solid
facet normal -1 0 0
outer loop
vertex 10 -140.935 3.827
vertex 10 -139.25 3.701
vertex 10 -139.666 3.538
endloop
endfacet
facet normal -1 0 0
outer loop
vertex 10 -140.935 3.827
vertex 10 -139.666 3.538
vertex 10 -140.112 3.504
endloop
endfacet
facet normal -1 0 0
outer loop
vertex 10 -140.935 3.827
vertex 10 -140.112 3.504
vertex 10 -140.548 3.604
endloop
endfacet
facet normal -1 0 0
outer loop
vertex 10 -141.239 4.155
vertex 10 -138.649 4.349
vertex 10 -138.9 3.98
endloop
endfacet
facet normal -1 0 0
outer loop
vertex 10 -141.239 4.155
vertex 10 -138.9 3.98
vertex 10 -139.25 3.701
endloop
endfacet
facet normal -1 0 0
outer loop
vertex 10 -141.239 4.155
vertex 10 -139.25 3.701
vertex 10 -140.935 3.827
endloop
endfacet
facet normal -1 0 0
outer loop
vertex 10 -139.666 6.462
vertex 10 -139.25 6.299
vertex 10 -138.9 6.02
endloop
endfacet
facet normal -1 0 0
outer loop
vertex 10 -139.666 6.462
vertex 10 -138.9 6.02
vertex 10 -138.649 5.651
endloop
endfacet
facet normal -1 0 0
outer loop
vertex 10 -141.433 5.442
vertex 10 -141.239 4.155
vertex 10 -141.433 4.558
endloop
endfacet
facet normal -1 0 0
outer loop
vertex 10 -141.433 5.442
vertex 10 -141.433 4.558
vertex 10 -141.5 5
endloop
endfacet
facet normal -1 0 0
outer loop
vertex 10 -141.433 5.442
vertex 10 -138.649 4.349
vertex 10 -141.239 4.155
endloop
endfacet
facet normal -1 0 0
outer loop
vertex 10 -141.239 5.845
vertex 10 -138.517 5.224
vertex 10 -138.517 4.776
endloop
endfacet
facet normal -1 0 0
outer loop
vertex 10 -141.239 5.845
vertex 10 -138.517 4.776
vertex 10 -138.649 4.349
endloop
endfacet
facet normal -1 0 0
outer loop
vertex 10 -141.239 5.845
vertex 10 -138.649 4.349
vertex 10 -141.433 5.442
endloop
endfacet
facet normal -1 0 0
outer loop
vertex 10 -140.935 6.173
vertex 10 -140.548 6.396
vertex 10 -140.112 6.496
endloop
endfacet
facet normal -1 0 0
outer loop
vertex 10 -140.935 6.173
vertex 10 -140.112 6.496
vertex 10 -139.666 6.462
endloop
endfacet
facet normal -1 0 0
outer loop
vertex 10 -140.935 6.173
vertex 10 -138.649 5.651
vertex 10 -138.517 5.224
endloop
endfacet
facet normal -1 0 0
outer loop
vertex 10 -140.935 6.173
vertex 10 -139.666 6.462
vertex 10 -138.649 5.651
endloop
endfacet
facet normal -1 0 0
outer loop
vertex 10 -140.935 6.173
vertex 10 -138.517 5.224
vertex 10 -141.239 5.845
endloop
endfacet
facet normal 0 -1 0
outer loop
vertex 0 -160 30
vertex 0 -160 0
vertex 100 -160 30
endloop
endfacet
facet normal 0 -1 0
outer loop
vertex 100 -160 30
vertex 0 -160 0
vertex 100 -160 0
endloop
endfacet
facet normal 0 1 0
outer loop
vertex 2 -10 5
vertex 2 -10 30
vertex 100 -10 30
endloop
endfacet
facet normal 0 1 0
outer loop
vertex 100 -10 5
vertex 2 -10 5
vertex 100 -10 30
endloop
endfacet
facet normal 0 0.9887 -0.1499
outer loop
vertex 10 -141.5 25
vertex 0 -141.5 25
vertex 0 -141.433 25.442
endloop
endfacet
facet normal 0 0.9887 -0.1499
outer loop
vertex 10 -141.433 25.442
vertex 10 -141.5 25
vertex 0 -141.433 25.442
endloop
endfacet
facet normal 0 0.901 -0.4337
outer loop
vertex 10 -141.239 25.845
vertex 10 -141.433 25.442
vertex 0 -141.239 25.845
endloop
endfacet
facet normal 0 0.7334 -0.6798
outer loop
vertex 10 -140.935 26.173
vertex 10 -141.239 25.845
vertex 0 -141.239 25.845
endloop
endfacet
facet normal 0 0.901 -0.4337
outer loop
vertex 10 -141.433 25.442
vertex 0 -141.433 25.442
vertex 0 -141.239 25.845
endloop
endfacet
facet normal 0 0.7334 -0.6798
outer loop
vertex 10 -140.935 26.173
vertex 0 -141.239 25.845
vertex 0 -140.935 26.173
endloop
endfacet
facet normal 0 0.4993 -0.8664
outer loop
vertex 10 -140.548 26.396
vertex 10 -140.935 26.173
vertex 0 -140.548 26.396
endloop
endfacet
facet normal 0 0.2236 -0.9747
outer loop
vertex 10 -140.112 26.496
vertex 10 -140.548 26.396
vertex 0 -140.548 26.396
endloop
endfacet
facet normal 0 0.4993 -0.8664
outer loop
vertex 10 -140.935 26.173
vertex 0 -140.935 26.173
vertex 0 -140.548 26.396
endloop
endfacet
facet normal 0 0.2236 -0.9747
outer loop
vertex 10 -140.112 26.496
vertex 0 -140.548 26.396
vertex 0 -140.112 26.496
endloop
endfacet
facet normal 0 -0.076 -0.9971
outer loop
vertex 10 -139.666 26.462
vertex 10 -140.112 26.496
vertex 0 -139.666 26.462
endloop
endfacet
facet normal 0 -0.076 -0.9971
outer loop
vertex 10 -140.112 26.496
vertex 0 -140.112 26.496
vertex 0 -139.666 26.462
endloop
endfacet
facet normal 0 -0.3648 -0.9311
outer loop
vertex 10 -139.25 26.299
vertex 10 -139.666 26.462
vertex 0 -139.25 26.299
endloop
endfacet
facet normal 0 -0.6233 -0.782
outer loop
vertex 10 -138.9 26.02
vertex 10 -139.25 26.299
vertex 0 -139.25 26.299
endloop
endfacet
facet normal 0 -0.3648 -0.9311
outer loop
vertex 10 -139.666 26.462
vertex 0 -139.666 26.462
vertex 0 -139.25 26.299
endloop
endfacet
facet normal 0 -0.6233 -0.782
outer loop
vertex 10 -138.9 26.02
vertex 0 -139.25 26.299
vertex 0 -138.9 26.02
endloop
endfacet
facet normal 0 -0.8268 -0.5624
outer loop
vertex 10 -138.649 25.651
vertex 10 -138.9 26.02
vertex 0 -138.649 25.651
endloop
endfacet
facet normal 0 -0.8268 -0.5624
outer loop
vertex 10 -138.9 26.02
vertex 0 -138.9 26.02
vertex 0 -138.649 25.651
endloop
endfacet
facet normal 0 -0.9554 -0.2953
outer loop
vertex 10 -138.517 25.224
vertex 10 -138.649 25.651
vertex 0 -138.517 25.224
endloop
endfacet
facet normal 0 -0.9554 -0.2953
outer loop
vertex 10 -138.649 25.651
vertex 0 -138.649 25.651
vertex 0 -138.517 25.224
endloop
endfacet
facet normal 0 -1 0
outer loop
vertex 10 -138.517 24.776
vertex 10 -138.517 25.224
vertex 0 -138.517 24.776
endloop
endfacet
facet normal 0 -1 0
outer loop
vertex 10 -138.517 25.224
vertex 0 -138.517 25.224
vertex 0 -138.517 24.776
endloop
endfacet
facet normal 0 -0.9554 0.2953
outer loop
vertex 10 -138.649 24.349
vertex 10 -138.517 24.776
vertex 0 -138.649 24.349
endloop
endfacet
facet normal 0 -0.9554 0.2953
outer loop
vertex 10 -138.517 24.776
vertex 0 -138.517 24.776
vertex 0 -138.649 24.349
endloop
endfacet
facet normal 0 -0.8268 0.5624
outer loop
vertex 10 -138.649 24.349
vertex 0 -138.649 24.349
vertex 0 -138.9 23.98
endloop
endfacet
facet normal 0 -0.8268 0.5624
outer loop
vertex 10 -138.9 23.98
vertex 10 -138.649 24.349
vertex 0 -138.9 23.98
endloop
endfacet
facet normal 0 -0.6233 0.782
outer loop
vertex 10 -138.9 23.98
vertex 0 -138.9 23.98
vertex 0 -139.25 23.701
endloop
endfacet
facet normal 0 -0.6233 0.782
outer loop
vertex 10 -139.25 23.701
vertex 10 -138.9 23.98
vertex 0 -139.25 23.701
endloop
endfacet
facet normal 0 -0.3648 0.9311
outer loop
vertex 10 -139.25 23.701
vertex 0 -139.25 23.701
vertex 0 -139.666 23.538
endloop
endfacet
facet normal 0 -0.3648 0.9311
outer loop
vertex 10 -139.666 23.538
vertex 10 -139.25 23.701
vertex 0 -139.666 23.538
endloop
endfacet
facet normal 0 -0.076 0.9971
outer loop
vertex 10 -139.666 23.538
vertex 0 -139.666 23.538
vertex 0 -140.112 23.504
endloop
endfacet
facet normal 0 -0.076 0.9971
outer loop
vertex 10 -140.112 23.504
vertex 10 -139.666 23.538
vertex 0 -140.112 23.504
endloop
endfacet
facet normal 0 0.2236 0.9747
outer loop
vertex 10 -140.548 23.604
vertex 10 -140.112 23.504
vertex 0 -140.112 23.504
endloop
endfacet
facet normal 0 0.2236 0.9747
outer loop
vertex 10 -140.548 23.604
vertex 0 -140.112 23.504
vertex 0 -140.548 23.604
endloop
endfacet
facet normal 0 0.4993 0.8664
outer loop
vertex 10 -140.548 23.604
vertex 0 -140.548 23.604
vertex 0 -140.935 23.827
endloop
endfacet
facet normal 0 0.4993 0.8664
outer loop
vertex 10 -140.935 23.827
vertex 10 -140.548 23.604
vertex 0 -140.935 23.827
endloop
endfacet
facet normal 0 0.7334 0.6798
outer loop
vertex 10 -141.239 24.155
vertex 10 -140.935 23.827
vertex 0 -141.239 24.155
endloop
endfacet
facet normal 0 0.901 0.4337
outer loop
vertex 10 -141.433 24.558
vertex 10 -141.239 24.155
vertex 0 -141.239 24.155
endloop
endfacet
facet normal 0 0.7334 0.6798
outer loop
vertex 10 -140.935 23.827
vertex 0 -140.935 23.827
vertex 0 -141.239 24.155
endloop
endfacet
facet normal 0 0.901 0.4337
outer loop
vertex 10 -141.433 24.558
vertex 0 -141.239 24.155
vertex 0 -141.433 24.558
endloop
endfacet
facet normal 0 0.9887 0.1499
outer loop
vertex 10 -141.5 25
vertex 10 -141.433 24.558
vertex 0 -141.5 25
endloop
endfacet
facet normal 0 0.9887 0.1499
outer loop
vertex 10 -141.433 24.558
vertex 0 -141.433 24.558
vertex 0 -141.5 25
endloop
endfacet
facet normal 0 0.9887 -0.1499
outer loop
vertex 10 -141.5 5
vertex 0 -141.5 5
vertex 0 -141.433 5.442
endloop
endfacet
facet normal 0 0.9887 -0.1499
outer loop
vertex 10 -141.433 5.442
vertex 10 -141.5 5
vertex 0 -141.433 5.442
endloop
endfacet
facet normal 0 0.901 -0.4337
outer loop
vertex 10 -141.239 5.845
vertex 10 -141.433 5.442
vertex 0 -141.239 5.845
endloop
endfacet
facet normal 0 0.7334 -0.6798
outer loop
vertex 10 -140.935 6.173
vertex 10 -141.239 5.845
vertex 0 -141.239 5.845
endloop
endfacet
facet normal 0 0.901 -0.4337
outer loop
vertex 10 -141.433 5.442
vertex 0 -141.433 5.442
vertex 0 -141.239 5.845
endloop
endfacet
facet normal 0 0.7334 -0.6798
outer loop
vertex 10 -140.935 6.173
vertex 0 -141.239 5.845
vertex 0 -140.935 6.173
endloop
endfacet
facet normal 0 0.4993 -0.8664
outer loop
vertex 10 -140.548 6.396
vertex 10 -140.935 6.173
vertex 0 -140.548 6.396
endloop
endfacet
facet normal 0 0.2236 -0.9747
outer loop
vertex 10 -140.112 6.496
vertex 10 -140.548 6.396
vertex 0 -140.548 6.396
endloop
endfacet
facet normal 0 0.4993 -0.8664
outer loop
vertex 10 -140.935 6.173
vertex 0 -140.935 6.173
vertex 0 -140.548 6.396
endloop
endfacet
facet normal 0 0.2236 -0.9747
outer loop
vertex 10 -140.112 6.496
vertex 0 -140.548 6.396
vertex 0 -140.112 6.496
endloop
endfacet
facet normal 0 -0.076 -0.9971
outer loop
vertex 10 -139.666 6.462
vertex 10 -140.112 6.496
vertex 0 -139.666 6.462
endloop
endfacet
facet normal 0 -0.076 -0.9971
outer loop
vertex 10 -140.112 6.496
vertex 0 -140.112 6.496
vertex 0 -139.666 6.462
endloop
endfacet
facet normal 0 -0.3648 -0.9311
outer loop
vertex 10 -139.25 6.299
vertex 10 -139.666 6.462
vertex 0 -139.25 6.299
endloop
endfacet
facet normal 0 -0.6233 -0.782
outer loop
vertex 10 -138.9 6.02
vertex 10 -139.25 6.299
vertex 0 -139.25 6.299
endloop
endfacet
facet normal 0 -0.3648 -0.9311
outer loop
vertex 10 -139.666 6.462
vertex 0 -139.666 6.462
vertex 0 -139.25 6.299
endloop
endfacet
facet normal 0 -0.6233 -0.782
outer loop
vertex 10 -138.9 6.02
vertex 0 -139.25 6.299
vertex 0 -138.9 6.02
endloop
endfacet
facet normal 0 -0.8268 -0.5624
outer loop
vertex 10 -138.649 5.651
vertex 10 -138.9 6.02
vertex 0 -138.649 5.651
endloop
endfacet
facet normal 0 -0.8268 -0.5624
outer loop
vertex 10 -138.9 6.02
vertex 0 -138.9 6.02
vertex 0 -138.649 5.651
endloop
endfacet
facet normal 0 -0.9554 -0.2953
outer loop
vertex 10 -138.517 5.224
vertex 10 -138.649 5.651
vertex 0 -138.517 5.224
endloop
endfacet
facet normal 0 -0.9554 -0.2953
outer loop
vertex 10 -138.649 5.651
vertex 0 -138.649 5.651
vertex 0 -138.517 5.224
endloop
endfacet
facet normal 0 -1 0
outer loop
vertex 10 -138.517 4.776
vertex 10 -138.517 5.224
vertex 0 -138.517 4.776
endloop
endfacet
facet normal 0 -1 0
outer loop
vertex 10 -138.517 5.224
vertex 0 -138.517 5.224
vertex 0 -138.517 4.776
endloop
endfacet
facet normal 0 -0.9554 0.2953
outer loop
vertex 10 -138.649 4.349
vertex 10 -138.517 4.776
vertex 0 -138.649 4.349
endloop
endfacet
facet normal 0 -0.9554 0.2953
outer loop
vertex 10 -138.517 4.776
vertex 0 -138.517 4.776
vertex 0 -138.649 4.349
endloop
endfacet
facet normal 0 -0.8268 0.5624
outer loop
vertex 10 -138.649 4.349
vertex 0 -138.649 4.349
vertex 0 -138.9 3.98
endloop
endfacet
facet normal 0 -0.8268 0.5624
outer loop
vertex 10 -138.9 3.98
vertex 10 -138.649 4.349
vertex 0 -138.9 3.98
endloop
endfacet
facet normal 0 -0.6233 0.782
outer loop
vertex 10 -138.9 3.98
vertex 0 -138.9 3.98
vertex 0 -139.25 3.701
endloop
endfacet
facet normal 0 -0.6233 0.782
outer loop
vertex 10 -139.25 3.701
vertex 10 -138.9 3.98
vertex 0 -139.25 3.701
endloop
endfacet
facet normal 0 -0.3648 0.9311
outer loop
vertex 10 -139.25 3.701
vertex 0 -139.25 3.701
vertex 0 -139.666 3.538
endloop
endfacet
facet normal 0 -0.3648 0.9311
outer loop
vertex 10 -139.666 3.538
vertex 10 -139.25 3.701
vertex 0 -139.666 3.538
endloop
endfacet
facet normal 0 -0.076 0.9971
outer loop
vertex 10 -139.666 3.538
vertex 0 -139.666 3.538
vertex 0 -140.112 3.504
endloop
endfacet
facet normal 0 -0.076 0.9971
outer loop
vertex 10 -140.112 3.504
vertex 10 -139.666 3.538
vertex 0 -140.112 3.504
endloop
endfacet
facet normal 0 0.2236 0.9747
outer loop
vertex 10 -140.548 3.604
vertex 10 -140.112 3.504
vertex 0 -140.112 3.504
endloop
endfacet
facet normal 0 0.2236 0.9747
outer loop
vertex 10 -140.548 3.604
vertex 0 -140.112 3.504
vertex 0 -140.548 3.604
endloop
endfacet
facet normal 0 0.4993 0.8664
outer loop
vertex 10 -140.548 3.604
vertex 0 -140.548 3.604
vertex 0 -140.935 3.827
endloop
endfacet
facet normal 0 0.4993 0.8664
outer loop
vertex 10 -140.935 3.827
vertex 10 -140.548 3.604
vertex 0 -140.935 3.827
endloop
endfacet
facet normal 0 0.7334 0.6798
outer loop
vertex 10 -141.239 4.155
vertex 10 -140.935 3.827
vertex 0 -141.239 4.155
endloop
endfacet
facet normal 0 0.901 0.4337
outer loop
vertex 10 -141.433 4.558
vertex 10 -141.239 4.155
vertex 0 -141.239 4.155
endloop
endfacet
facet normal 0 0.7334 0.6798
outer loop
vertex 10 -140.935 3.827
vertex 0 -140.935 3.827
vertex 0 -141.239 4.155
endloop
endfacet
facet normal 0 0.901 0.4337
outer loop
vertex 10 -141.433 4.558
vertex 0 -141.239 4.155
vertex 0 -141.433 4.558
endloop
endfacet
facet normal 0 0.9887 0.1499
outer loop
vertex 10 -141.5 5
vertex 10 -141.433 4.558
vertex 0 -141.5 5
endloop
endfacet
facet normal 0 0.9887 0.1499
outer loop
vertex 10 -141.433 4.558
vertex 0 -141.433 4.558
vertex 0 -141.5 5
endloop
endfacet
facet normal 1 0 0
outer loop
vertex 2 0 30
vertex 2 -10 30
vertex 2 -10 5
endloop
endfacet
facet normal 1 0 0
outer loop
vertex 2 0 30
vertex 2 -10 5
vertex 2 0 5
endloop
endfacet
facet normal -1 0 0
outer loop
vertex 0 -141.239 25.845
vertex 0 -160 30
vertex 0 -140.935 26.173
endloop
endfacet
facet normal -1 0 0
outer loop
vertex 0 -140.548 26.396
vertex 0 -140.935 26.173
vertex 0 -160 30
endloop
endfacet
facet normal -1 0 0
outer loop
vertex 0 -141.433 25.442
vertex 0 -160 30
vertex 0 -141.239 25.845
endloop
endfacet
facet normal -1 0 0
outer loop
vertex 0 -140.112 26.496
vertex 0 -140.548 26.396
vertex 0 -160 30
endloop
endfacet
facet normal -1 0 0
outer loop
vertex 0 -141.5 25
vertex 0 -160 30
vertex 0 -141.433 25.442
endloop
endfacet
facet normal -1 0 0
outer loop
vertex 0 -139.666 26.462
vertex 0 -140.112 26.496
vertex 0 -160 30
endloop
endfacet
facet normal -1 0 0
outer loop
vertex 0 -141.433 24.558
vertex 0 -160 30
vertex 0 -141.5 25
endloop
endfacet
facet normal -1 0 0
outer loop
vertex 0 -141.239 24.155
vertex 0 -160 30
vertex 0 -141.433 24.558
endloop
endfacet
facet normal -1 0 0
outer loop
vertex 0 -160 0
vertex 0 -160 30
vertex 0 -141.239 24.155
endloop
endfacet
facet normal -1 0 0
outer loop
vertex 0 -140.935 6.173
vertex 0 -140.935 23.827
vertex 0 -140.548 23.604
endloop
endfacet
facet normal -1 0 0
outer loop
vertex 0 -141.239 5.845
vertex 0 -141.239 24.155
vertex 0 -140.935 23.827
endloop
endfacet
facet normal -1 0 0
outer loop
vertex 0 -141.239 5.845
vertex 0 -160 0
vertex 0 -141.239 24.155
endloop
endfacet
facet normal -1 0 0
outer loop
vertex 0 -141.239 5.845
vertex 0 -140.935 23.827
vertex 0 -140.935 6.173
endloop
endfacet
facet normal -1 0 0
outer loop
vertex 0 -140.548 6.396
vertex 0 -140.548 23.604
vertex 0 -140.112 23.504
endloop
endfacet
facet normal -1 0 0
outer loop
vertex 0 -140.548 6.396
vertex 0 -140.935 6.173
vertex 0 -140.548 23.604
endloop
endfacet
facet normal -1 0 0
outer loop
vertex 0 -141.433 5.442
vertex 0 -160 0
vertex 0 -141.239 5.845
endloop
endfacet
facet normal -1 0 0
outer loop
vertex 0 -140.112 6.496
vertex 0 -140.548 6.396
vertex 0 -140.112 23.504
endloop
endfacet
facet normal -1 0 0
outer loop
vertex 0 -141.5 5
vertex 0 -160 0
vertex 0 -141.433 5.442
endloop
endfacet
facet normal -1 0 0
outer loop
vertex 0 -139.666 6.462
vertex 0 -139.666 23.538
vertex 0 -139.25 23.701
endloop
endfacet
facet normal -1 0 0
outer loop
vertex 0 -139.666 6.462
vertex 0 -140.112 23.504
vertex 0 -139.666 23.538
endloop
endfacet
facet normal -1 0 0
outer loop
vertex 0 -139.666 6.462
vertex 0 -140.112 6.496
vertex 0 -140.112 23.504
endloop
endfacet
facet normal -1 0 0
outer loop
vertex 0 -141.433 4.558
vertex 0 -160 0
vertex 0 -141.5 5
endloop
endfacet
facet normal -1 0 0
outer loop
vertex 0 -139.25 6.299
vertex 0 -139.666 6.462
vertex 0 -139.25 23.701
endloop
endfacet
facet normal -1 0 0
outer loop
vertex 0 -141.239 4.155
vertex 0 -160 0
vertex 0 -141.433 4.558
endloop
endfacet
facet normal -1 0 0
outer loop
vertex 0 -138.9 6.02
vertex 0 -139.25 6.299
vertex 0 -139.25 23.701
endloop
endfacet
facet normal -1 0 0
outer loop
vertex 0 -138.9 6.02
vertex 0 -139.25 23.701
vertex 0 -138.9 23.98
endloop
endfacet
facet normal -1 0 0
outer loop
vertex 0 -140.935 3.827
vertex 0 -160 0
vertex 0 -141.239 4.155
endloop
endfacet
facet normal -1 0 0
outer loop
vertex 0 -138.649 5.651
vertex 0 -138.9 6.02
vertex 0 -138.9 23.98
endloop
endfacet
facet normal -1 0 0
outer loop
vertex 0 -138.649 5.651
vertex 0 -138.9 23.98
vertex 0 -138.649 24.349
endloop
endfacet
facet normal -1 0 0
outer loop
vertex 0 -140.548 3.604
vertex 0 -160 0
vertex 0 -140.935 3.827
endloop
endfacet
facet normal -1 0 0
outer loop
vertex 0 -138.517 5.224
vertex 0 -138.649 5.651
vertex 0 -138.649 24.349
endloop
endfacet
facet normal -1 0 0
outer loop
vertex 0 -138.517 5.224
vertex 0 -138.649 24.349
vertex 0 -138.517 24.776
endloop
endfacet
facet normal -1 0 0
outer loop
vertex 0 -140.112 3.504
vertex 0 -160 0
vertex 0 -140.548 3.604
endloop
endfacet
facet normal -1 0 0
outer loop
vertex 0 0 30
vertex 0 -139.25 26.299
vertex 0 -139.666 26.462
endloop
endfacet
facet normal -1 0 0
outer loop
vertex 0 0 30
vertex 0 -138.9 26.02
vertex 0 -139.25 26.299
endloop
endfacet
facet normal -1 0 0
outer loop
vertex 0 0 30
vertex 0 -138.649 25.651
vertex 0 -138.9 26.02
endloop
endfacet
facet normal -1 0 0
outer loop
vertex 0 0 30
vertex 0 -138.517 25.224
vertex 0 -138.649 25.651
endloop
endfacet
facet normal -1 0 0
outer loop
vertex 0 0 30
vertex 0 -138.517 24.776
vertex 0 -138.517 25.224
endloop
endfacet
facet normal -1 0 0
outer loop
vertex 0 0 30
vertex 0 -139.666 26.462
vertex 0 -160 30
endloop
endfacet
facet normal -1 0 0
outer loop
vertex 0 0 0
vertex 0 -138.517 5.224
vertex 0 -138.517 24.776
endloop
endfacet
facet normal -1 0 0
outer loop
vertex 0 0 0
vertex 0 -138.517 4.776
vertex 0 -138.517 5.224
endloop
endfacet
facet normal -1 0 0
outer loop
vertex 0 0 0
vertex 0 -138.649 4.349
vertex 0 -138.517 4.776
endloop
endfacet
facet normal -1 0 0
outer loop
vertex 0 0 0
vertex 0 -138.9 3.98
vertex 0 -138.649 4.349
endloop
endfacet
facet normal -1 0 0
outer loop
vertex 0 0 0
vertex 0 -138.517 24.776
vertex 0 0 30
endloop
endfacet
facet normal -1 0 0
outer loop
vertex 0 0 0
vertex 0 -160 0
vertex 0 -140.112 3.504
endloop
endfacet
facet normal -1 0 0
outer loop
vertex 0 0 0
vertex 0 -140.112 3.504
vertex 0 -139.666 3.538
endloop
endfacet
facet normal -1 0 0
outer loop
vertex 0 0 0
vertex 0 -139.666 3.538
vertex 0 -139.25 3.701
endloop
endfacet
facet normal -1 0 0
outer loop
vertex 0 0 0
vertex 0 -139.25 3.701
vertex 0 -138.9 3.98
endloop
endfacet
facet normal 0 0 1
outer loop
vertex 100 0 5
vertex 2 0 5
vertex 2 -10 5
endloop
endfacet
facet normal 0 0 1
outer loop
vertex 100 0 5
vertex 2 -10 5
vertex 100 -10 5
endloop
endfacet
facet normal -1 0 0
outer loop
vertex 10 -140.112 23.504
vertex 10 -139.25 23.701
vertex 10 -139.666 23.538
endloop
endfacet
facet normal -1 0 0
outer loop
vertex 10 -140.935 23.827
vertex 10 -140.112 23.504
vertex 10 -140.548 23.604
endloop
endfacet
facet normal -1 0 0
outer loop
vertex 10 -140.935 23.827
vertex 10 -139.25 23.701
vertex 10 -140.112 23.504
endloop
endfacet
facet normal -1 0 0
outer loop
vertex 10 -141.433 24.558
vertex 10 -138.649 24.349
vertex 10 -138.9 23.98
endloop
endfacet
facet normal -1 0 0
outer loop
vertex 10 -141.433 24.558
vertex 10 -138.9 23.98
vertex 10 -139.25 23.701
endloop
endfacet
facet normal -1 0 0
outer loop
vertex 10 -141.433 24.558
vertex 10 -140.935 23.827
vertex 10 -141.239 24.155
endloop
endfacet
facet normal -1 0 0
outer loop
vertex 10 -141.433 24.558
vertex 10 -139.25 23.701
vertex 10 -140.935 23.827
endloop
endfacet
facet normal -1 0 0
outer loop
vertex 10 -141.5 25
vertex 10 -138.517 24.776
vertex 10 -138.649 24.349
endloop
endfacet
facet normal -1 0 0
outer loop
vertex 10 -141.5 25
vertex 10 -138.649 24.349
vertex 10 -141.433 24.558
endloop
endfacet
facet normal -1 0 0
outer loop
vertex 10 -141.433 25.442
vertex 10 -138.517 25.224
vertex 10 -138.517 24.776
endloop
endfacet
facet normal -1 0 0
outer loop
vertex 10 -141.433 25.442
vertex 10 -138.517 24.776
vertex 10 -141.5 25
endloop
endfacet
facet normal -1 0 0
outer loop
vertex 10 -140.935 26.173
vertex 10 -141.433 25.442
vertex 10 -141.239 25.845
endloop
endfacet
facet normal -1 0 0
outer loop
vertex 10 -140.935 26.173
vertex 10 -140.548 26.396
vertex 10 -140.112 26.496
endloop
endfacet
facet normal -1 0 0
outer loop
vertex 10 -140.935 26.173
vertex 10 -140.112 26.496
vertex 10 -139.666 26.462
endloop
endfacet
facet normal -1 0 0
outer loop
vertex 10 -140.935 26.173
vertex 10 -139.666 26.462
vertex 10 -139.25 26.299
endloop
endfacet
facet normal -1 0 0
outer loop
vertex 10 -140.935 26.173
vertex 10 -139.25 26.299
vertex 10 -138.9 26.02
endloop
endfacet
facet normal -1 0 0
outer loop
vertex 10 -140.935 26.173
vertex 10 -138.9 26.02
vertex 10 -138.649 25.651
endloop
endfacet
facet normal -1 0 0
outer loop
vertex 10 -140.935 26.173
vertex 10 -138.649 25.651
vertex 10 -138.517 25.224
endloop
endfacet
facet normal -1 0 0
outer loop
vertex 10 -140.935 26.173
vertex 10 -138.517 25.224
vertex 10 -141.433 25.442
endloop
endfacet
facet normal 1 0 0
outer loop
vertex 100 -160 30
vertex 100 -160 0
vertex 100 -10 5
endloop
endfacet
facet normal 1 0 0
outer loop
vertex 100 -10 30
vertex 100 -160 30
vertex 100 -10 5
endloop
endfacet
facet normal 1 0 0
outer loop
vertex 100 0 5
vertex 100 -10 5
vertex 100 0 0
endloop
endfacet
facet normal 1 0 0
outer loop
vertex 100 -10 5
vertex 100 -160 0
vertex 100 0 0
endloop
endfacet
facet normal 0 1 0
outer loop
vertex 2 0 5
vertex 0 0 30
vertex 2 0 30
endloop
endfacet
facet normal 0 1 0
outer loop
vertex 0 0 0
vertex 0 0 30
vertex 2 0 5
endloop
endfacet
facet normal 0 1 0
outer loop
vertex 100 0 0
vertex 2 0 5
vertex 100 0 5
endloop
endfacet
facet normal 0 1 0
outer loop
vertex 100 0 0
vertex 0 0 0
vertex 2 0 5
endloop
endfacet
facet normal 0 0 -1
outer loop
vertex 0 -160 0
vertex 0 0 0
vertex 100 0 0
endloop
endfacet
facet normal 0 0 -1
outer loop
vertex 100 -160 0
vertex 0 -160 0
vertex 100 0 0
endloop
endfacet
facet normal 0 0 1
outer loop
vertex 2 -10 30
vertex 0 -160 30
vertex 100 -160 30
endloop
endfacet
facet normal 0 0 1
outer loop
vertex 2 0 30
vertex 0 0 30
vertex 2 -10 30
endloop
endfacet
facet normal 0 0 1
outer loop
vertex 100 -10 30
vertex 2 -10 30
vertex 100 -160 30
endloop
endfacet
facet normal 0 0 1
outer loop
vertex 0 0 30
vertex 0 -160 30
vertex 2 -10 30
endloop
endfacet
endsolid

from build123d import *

# Parameters (mm, degrees)
F0_W     = 100
F0_H     = 160
F1_DEPTH = 30
F2_R     = 1.5
F3_DEPTH = 10
F4_W     = 98
F4_H     = 10
F5_DEPTH = 25


with BuildPart() as f1:
    # F0 (on Top) → F1 (new body)
    with BuildSketch(Plane.XY):
        with Locations((50, -80)):
            Rectangle(F0_W, F0_H)
    extrude(amount=F1_DEPTH)

    # F2 (on face) → F3 (cut)
    with BuildSketch(Plane(origin=(0, 0, 0), x_dir=(0, -1, 0), z_dir=(-1, 0, 0))):
        with Locations((140, 25)):
            Circle(F2_R)
        with Locations((140, 5)):
            Circle(F2_R)
    extrude(amount=-F3_DEPTH, mode=Mode.SUBTRACT)

    # F4 (on face) → F5 (cut)
    with BuildSketch(Plane.XY.offset(30)):
        with Locations((51, -5)):
            Rectangle(F4_W, F4_H)
    extrude(amount=-F5_DEPTH, mode=Mode.SUBTRACT)


solid = f1.part
